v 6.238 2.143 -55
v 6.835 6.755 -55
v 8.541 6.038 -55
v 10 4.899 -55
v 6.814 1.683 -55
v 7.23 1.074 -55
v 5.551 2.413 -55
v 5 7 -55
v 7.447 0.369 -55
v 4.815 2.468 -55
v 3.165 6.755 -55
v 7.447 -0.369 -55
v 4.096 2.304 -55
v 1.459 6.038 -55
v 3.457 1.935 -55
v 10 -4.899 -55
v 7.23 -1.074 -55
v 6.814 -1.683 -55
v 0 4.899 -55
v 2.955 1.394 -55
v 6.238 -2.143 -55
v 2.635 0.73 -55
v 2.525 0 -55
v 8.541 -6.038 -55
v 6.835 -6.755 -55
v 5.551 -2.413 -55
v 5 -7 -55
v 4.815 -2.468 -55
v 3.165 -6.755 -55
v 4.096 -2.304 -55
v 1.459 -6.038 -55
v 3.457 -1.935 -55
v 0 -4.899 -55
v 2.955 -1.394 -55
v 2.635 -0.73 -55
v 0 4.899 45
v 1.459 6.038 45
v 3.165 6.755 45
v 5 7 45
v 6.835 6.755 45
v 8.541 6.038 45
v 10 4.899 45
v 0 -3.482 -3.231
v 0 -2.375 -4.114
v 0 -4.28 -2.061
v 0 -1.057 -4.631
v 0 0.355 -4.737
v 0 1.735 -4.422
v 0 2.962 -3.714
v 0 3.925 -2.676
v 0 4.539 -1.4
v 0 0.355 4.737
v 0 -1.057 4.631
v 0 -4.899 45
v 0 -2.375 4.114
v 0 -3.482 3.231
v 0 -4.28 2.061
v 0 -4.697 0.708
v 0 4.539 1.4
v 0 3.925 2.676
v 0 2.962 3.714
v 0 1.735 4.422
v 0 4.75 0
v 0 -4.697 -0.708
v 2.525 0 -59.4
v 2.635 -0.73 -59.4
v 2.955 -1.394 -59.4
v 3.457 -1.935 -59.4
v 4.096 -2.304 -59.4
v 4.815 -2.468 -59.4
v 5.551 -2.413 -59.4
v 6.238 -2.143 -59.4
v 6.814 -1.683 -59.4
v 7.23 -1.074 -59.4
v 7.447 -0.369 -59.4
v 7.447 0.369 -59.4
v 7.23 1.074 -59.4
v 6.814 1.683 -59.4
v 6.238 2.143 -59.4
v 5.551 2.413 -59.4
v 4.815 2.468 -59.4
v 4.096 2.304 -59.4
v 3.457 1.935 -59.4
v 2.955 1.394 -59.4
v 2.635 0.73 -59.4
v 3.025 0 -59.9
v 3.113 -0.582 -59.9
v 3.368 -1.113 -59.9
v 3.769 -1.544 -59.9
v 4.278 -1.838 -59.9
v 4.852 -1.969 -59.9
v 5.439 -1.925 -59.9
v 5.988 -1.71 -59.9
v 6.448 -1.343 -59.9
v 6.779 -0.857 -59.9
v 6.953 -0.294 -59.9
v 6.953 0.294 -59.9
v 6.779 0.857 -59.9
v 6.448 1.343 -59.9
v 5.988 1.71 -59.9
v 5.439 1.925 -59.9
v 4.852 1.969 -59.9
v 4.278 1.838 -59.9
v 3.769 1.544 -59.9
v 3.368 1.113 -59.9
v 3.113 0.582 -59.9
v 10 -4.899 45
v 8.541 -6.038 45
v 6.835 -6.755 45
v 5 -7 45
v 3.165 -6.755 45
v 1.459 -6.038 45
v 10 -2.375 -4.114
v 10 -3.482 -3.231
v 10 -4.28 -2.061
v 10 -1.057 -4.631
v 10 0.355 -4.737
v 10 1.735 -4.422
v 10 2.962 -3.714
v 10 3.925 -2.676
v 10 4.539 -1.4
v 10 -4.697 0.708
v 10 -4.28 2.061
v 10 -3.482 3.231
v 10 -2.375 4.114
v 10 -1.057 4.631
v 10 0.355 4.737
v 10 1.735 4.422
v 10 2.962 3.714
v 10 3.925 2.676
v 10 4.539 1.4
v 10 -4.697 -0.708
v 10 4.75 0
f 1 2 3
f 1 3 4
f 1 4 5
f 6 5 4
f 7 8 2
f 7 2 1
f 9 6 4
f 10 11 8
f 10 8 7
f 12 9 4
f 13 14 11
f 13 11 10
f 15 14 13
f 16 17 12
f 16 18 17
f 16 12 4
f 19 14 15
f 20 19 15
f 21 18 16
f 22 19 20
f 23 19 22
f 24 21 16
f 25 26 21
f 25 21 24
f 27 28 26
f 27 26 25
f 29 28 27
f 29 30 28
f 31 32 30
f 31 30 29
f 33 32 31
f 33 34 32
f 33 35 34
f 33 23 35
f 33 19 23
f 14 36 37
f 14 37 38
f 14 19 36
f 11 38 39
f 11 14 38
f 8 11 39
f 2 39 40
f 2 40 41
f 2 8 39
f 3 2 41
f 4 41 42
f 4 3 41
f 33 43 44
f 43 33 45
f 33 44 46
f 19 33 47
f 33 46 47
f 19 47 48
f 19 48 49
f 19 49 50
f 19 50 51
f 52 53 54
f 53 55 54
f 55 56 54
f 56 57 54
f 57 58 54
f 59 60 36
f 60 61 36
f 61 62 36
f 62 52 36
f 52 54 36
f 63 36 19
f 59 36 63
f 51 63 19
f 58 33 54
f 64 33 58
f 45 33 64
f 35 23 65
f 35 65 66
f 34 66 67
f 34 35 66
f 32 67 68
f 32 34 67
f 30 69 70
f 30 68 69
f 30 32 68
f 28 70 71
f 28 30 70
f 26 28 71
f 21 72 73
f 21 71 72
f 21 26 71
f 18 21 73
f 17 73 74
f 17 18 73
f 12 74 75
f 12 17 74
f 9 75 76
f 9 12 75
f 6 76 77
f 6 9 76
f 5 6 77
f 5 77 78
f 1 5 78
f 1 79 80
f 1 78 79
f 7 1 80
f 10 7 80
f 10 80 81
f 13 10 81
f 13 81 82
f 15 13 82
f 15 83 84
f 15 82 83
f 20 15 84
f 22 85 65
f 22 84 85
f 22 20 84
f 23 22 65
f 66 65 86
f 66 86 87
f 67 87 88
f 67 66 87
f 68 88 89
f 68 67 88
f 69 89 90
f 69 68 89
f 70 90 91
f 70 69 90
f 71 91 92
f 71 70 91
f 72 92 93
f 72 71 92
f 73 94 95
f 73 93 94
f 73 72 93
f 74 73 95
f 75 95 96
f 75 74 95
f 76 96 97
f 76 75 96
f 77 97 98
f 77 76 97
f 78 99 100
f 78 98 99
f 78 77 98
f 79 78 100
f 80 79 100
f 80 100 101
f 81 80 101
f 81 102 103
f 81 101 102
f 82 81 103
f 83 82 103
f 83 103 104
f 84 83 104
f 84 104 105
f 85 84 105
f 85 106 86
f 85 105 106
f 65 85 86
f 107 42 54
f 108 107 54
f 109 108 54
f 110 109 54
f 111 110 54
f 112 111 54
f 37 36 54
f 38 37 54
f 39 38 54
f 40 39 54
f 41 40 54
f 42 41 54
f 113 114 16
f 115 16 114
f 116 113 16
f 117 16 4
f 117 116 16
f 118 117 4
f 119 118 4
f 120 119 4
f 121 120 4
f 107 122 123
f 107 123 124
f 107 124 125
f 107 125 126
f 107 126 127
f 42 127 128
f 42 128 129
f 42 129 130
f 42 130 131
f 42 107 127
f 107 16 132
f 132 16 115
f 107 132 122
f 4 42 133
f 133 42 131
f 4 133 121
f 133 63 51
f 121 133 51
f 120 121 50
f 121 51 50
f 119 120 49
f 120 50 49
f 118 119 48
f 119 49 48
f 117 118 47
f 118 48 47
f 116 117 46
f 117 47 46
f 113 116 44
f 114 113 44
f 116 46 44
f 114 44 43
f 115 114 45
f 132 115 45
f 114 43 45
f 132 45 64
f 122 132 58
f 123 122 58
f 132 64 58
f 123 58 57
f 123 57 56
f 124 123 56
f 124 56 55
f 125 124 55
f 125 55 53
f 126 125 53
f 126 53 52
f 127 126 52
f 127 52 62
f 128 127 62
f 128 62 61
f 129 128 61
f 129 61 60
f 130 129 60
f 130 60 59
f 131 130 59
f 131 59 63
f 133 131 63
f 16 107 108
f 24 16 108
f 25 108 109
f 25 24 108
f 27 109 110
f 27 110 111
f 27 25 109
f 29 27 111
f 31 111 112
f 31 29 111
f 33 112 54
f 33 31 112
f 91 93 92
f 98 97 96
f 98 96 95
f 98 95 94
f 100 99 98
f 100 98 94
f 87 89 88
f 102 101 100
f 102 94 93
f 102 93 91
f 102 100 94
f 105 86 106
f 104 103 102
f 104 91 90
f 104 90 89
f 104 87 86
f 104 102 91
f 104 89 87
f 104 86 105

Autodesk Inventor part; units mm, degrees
ref_plane "YZ Plane" through (0, 0, 0) normal (1, 0, 0) x (0, 1, 0)
ref_plane "XZ Plane" through (0, 0, 0) normal (0, 1, 0) x (-1, 0, 0)
ref_plane "XY Plane" through (0, 0, 0) normal (0, 0, 1) x (1, 0, 0)
sketch "Sketch1" plane through (0, 0, 0) normal (1, 0, 0) x (0, 1, 0)
  circle A0 centre (0, 0) radius 4.75
  line L0 (10, 45) -> (-10, 45)
  line L1 (10, 38) -> (-10, 38)
  line L2 (10, 45) -> (10, 38)
  line L3 (-10, 38) -> (-10, 45)
  line L4 (-4.75, 0) -> (-8.4137, 0)
  line L5 (-14, 0) -> (14, 0) projected
  line L6 (10, -55) -> (-10, -55)
  line L7 (-10, -55) -> (-10, -48)
  line L8 (-10, -48) -> (10, -48)
  line L9 (10, -48) -> (10, -55)
  line L10 (10, 38) -> (10, -48)
  line L11 (-10, -48) -> (-10, 38)
  point P0 (0, 45)
  point P1 (0, -55)
  dimension "d0" = 9.5
  dimension "d1" = 20
  dimension "d2" = 0
  dimension "d3" = 7
  dimension "d4" = 45
  dimension "d8" = 20
  dimension "d9" = 7
  dimension "d10" = 0
  dimension "d11" = 55
extrude "Extrusion1" add sketch "Sketch1" along normal blind 10 contours L5 L10 L8 L11 L4 A0 | A0 L4 L5 L11 L1 L10 | L1 L3 L0 L2 | L9 L6 L7 L8
sketch "Sketch2" plane through (0, -10, -55) normal (0, 0, -1) x (-1, 0, 0)
  circle A0 centre (-5, 10) radius 2.475
  point P0 (0, 10)
  dimension "d12" = 4.95
extrude "Extrusion2" add sketch "Sketch2" along normal blind 4.9
chamfer "Chamfer1" distance 0.5 angle 45 1 edges at (7.475, 0, -59.9)
sketch "Sketch3" plane through (0, -10, -55) normal (0, 0, -1) x (-1, 0, 0)
  circle A0 centre (-5, 10) radius 2.475 projected
  circle A1 centre (-5, 10) radius 7
  circle A2 centre (-5, 10) radius 17.4724
  point P0 (0, 10)
  dimension "d18" = 14
extrude "Extrusion3" cut sketch "Sketch3" against normal through all contours A2
properties part number "temp_nozzle_v2"
